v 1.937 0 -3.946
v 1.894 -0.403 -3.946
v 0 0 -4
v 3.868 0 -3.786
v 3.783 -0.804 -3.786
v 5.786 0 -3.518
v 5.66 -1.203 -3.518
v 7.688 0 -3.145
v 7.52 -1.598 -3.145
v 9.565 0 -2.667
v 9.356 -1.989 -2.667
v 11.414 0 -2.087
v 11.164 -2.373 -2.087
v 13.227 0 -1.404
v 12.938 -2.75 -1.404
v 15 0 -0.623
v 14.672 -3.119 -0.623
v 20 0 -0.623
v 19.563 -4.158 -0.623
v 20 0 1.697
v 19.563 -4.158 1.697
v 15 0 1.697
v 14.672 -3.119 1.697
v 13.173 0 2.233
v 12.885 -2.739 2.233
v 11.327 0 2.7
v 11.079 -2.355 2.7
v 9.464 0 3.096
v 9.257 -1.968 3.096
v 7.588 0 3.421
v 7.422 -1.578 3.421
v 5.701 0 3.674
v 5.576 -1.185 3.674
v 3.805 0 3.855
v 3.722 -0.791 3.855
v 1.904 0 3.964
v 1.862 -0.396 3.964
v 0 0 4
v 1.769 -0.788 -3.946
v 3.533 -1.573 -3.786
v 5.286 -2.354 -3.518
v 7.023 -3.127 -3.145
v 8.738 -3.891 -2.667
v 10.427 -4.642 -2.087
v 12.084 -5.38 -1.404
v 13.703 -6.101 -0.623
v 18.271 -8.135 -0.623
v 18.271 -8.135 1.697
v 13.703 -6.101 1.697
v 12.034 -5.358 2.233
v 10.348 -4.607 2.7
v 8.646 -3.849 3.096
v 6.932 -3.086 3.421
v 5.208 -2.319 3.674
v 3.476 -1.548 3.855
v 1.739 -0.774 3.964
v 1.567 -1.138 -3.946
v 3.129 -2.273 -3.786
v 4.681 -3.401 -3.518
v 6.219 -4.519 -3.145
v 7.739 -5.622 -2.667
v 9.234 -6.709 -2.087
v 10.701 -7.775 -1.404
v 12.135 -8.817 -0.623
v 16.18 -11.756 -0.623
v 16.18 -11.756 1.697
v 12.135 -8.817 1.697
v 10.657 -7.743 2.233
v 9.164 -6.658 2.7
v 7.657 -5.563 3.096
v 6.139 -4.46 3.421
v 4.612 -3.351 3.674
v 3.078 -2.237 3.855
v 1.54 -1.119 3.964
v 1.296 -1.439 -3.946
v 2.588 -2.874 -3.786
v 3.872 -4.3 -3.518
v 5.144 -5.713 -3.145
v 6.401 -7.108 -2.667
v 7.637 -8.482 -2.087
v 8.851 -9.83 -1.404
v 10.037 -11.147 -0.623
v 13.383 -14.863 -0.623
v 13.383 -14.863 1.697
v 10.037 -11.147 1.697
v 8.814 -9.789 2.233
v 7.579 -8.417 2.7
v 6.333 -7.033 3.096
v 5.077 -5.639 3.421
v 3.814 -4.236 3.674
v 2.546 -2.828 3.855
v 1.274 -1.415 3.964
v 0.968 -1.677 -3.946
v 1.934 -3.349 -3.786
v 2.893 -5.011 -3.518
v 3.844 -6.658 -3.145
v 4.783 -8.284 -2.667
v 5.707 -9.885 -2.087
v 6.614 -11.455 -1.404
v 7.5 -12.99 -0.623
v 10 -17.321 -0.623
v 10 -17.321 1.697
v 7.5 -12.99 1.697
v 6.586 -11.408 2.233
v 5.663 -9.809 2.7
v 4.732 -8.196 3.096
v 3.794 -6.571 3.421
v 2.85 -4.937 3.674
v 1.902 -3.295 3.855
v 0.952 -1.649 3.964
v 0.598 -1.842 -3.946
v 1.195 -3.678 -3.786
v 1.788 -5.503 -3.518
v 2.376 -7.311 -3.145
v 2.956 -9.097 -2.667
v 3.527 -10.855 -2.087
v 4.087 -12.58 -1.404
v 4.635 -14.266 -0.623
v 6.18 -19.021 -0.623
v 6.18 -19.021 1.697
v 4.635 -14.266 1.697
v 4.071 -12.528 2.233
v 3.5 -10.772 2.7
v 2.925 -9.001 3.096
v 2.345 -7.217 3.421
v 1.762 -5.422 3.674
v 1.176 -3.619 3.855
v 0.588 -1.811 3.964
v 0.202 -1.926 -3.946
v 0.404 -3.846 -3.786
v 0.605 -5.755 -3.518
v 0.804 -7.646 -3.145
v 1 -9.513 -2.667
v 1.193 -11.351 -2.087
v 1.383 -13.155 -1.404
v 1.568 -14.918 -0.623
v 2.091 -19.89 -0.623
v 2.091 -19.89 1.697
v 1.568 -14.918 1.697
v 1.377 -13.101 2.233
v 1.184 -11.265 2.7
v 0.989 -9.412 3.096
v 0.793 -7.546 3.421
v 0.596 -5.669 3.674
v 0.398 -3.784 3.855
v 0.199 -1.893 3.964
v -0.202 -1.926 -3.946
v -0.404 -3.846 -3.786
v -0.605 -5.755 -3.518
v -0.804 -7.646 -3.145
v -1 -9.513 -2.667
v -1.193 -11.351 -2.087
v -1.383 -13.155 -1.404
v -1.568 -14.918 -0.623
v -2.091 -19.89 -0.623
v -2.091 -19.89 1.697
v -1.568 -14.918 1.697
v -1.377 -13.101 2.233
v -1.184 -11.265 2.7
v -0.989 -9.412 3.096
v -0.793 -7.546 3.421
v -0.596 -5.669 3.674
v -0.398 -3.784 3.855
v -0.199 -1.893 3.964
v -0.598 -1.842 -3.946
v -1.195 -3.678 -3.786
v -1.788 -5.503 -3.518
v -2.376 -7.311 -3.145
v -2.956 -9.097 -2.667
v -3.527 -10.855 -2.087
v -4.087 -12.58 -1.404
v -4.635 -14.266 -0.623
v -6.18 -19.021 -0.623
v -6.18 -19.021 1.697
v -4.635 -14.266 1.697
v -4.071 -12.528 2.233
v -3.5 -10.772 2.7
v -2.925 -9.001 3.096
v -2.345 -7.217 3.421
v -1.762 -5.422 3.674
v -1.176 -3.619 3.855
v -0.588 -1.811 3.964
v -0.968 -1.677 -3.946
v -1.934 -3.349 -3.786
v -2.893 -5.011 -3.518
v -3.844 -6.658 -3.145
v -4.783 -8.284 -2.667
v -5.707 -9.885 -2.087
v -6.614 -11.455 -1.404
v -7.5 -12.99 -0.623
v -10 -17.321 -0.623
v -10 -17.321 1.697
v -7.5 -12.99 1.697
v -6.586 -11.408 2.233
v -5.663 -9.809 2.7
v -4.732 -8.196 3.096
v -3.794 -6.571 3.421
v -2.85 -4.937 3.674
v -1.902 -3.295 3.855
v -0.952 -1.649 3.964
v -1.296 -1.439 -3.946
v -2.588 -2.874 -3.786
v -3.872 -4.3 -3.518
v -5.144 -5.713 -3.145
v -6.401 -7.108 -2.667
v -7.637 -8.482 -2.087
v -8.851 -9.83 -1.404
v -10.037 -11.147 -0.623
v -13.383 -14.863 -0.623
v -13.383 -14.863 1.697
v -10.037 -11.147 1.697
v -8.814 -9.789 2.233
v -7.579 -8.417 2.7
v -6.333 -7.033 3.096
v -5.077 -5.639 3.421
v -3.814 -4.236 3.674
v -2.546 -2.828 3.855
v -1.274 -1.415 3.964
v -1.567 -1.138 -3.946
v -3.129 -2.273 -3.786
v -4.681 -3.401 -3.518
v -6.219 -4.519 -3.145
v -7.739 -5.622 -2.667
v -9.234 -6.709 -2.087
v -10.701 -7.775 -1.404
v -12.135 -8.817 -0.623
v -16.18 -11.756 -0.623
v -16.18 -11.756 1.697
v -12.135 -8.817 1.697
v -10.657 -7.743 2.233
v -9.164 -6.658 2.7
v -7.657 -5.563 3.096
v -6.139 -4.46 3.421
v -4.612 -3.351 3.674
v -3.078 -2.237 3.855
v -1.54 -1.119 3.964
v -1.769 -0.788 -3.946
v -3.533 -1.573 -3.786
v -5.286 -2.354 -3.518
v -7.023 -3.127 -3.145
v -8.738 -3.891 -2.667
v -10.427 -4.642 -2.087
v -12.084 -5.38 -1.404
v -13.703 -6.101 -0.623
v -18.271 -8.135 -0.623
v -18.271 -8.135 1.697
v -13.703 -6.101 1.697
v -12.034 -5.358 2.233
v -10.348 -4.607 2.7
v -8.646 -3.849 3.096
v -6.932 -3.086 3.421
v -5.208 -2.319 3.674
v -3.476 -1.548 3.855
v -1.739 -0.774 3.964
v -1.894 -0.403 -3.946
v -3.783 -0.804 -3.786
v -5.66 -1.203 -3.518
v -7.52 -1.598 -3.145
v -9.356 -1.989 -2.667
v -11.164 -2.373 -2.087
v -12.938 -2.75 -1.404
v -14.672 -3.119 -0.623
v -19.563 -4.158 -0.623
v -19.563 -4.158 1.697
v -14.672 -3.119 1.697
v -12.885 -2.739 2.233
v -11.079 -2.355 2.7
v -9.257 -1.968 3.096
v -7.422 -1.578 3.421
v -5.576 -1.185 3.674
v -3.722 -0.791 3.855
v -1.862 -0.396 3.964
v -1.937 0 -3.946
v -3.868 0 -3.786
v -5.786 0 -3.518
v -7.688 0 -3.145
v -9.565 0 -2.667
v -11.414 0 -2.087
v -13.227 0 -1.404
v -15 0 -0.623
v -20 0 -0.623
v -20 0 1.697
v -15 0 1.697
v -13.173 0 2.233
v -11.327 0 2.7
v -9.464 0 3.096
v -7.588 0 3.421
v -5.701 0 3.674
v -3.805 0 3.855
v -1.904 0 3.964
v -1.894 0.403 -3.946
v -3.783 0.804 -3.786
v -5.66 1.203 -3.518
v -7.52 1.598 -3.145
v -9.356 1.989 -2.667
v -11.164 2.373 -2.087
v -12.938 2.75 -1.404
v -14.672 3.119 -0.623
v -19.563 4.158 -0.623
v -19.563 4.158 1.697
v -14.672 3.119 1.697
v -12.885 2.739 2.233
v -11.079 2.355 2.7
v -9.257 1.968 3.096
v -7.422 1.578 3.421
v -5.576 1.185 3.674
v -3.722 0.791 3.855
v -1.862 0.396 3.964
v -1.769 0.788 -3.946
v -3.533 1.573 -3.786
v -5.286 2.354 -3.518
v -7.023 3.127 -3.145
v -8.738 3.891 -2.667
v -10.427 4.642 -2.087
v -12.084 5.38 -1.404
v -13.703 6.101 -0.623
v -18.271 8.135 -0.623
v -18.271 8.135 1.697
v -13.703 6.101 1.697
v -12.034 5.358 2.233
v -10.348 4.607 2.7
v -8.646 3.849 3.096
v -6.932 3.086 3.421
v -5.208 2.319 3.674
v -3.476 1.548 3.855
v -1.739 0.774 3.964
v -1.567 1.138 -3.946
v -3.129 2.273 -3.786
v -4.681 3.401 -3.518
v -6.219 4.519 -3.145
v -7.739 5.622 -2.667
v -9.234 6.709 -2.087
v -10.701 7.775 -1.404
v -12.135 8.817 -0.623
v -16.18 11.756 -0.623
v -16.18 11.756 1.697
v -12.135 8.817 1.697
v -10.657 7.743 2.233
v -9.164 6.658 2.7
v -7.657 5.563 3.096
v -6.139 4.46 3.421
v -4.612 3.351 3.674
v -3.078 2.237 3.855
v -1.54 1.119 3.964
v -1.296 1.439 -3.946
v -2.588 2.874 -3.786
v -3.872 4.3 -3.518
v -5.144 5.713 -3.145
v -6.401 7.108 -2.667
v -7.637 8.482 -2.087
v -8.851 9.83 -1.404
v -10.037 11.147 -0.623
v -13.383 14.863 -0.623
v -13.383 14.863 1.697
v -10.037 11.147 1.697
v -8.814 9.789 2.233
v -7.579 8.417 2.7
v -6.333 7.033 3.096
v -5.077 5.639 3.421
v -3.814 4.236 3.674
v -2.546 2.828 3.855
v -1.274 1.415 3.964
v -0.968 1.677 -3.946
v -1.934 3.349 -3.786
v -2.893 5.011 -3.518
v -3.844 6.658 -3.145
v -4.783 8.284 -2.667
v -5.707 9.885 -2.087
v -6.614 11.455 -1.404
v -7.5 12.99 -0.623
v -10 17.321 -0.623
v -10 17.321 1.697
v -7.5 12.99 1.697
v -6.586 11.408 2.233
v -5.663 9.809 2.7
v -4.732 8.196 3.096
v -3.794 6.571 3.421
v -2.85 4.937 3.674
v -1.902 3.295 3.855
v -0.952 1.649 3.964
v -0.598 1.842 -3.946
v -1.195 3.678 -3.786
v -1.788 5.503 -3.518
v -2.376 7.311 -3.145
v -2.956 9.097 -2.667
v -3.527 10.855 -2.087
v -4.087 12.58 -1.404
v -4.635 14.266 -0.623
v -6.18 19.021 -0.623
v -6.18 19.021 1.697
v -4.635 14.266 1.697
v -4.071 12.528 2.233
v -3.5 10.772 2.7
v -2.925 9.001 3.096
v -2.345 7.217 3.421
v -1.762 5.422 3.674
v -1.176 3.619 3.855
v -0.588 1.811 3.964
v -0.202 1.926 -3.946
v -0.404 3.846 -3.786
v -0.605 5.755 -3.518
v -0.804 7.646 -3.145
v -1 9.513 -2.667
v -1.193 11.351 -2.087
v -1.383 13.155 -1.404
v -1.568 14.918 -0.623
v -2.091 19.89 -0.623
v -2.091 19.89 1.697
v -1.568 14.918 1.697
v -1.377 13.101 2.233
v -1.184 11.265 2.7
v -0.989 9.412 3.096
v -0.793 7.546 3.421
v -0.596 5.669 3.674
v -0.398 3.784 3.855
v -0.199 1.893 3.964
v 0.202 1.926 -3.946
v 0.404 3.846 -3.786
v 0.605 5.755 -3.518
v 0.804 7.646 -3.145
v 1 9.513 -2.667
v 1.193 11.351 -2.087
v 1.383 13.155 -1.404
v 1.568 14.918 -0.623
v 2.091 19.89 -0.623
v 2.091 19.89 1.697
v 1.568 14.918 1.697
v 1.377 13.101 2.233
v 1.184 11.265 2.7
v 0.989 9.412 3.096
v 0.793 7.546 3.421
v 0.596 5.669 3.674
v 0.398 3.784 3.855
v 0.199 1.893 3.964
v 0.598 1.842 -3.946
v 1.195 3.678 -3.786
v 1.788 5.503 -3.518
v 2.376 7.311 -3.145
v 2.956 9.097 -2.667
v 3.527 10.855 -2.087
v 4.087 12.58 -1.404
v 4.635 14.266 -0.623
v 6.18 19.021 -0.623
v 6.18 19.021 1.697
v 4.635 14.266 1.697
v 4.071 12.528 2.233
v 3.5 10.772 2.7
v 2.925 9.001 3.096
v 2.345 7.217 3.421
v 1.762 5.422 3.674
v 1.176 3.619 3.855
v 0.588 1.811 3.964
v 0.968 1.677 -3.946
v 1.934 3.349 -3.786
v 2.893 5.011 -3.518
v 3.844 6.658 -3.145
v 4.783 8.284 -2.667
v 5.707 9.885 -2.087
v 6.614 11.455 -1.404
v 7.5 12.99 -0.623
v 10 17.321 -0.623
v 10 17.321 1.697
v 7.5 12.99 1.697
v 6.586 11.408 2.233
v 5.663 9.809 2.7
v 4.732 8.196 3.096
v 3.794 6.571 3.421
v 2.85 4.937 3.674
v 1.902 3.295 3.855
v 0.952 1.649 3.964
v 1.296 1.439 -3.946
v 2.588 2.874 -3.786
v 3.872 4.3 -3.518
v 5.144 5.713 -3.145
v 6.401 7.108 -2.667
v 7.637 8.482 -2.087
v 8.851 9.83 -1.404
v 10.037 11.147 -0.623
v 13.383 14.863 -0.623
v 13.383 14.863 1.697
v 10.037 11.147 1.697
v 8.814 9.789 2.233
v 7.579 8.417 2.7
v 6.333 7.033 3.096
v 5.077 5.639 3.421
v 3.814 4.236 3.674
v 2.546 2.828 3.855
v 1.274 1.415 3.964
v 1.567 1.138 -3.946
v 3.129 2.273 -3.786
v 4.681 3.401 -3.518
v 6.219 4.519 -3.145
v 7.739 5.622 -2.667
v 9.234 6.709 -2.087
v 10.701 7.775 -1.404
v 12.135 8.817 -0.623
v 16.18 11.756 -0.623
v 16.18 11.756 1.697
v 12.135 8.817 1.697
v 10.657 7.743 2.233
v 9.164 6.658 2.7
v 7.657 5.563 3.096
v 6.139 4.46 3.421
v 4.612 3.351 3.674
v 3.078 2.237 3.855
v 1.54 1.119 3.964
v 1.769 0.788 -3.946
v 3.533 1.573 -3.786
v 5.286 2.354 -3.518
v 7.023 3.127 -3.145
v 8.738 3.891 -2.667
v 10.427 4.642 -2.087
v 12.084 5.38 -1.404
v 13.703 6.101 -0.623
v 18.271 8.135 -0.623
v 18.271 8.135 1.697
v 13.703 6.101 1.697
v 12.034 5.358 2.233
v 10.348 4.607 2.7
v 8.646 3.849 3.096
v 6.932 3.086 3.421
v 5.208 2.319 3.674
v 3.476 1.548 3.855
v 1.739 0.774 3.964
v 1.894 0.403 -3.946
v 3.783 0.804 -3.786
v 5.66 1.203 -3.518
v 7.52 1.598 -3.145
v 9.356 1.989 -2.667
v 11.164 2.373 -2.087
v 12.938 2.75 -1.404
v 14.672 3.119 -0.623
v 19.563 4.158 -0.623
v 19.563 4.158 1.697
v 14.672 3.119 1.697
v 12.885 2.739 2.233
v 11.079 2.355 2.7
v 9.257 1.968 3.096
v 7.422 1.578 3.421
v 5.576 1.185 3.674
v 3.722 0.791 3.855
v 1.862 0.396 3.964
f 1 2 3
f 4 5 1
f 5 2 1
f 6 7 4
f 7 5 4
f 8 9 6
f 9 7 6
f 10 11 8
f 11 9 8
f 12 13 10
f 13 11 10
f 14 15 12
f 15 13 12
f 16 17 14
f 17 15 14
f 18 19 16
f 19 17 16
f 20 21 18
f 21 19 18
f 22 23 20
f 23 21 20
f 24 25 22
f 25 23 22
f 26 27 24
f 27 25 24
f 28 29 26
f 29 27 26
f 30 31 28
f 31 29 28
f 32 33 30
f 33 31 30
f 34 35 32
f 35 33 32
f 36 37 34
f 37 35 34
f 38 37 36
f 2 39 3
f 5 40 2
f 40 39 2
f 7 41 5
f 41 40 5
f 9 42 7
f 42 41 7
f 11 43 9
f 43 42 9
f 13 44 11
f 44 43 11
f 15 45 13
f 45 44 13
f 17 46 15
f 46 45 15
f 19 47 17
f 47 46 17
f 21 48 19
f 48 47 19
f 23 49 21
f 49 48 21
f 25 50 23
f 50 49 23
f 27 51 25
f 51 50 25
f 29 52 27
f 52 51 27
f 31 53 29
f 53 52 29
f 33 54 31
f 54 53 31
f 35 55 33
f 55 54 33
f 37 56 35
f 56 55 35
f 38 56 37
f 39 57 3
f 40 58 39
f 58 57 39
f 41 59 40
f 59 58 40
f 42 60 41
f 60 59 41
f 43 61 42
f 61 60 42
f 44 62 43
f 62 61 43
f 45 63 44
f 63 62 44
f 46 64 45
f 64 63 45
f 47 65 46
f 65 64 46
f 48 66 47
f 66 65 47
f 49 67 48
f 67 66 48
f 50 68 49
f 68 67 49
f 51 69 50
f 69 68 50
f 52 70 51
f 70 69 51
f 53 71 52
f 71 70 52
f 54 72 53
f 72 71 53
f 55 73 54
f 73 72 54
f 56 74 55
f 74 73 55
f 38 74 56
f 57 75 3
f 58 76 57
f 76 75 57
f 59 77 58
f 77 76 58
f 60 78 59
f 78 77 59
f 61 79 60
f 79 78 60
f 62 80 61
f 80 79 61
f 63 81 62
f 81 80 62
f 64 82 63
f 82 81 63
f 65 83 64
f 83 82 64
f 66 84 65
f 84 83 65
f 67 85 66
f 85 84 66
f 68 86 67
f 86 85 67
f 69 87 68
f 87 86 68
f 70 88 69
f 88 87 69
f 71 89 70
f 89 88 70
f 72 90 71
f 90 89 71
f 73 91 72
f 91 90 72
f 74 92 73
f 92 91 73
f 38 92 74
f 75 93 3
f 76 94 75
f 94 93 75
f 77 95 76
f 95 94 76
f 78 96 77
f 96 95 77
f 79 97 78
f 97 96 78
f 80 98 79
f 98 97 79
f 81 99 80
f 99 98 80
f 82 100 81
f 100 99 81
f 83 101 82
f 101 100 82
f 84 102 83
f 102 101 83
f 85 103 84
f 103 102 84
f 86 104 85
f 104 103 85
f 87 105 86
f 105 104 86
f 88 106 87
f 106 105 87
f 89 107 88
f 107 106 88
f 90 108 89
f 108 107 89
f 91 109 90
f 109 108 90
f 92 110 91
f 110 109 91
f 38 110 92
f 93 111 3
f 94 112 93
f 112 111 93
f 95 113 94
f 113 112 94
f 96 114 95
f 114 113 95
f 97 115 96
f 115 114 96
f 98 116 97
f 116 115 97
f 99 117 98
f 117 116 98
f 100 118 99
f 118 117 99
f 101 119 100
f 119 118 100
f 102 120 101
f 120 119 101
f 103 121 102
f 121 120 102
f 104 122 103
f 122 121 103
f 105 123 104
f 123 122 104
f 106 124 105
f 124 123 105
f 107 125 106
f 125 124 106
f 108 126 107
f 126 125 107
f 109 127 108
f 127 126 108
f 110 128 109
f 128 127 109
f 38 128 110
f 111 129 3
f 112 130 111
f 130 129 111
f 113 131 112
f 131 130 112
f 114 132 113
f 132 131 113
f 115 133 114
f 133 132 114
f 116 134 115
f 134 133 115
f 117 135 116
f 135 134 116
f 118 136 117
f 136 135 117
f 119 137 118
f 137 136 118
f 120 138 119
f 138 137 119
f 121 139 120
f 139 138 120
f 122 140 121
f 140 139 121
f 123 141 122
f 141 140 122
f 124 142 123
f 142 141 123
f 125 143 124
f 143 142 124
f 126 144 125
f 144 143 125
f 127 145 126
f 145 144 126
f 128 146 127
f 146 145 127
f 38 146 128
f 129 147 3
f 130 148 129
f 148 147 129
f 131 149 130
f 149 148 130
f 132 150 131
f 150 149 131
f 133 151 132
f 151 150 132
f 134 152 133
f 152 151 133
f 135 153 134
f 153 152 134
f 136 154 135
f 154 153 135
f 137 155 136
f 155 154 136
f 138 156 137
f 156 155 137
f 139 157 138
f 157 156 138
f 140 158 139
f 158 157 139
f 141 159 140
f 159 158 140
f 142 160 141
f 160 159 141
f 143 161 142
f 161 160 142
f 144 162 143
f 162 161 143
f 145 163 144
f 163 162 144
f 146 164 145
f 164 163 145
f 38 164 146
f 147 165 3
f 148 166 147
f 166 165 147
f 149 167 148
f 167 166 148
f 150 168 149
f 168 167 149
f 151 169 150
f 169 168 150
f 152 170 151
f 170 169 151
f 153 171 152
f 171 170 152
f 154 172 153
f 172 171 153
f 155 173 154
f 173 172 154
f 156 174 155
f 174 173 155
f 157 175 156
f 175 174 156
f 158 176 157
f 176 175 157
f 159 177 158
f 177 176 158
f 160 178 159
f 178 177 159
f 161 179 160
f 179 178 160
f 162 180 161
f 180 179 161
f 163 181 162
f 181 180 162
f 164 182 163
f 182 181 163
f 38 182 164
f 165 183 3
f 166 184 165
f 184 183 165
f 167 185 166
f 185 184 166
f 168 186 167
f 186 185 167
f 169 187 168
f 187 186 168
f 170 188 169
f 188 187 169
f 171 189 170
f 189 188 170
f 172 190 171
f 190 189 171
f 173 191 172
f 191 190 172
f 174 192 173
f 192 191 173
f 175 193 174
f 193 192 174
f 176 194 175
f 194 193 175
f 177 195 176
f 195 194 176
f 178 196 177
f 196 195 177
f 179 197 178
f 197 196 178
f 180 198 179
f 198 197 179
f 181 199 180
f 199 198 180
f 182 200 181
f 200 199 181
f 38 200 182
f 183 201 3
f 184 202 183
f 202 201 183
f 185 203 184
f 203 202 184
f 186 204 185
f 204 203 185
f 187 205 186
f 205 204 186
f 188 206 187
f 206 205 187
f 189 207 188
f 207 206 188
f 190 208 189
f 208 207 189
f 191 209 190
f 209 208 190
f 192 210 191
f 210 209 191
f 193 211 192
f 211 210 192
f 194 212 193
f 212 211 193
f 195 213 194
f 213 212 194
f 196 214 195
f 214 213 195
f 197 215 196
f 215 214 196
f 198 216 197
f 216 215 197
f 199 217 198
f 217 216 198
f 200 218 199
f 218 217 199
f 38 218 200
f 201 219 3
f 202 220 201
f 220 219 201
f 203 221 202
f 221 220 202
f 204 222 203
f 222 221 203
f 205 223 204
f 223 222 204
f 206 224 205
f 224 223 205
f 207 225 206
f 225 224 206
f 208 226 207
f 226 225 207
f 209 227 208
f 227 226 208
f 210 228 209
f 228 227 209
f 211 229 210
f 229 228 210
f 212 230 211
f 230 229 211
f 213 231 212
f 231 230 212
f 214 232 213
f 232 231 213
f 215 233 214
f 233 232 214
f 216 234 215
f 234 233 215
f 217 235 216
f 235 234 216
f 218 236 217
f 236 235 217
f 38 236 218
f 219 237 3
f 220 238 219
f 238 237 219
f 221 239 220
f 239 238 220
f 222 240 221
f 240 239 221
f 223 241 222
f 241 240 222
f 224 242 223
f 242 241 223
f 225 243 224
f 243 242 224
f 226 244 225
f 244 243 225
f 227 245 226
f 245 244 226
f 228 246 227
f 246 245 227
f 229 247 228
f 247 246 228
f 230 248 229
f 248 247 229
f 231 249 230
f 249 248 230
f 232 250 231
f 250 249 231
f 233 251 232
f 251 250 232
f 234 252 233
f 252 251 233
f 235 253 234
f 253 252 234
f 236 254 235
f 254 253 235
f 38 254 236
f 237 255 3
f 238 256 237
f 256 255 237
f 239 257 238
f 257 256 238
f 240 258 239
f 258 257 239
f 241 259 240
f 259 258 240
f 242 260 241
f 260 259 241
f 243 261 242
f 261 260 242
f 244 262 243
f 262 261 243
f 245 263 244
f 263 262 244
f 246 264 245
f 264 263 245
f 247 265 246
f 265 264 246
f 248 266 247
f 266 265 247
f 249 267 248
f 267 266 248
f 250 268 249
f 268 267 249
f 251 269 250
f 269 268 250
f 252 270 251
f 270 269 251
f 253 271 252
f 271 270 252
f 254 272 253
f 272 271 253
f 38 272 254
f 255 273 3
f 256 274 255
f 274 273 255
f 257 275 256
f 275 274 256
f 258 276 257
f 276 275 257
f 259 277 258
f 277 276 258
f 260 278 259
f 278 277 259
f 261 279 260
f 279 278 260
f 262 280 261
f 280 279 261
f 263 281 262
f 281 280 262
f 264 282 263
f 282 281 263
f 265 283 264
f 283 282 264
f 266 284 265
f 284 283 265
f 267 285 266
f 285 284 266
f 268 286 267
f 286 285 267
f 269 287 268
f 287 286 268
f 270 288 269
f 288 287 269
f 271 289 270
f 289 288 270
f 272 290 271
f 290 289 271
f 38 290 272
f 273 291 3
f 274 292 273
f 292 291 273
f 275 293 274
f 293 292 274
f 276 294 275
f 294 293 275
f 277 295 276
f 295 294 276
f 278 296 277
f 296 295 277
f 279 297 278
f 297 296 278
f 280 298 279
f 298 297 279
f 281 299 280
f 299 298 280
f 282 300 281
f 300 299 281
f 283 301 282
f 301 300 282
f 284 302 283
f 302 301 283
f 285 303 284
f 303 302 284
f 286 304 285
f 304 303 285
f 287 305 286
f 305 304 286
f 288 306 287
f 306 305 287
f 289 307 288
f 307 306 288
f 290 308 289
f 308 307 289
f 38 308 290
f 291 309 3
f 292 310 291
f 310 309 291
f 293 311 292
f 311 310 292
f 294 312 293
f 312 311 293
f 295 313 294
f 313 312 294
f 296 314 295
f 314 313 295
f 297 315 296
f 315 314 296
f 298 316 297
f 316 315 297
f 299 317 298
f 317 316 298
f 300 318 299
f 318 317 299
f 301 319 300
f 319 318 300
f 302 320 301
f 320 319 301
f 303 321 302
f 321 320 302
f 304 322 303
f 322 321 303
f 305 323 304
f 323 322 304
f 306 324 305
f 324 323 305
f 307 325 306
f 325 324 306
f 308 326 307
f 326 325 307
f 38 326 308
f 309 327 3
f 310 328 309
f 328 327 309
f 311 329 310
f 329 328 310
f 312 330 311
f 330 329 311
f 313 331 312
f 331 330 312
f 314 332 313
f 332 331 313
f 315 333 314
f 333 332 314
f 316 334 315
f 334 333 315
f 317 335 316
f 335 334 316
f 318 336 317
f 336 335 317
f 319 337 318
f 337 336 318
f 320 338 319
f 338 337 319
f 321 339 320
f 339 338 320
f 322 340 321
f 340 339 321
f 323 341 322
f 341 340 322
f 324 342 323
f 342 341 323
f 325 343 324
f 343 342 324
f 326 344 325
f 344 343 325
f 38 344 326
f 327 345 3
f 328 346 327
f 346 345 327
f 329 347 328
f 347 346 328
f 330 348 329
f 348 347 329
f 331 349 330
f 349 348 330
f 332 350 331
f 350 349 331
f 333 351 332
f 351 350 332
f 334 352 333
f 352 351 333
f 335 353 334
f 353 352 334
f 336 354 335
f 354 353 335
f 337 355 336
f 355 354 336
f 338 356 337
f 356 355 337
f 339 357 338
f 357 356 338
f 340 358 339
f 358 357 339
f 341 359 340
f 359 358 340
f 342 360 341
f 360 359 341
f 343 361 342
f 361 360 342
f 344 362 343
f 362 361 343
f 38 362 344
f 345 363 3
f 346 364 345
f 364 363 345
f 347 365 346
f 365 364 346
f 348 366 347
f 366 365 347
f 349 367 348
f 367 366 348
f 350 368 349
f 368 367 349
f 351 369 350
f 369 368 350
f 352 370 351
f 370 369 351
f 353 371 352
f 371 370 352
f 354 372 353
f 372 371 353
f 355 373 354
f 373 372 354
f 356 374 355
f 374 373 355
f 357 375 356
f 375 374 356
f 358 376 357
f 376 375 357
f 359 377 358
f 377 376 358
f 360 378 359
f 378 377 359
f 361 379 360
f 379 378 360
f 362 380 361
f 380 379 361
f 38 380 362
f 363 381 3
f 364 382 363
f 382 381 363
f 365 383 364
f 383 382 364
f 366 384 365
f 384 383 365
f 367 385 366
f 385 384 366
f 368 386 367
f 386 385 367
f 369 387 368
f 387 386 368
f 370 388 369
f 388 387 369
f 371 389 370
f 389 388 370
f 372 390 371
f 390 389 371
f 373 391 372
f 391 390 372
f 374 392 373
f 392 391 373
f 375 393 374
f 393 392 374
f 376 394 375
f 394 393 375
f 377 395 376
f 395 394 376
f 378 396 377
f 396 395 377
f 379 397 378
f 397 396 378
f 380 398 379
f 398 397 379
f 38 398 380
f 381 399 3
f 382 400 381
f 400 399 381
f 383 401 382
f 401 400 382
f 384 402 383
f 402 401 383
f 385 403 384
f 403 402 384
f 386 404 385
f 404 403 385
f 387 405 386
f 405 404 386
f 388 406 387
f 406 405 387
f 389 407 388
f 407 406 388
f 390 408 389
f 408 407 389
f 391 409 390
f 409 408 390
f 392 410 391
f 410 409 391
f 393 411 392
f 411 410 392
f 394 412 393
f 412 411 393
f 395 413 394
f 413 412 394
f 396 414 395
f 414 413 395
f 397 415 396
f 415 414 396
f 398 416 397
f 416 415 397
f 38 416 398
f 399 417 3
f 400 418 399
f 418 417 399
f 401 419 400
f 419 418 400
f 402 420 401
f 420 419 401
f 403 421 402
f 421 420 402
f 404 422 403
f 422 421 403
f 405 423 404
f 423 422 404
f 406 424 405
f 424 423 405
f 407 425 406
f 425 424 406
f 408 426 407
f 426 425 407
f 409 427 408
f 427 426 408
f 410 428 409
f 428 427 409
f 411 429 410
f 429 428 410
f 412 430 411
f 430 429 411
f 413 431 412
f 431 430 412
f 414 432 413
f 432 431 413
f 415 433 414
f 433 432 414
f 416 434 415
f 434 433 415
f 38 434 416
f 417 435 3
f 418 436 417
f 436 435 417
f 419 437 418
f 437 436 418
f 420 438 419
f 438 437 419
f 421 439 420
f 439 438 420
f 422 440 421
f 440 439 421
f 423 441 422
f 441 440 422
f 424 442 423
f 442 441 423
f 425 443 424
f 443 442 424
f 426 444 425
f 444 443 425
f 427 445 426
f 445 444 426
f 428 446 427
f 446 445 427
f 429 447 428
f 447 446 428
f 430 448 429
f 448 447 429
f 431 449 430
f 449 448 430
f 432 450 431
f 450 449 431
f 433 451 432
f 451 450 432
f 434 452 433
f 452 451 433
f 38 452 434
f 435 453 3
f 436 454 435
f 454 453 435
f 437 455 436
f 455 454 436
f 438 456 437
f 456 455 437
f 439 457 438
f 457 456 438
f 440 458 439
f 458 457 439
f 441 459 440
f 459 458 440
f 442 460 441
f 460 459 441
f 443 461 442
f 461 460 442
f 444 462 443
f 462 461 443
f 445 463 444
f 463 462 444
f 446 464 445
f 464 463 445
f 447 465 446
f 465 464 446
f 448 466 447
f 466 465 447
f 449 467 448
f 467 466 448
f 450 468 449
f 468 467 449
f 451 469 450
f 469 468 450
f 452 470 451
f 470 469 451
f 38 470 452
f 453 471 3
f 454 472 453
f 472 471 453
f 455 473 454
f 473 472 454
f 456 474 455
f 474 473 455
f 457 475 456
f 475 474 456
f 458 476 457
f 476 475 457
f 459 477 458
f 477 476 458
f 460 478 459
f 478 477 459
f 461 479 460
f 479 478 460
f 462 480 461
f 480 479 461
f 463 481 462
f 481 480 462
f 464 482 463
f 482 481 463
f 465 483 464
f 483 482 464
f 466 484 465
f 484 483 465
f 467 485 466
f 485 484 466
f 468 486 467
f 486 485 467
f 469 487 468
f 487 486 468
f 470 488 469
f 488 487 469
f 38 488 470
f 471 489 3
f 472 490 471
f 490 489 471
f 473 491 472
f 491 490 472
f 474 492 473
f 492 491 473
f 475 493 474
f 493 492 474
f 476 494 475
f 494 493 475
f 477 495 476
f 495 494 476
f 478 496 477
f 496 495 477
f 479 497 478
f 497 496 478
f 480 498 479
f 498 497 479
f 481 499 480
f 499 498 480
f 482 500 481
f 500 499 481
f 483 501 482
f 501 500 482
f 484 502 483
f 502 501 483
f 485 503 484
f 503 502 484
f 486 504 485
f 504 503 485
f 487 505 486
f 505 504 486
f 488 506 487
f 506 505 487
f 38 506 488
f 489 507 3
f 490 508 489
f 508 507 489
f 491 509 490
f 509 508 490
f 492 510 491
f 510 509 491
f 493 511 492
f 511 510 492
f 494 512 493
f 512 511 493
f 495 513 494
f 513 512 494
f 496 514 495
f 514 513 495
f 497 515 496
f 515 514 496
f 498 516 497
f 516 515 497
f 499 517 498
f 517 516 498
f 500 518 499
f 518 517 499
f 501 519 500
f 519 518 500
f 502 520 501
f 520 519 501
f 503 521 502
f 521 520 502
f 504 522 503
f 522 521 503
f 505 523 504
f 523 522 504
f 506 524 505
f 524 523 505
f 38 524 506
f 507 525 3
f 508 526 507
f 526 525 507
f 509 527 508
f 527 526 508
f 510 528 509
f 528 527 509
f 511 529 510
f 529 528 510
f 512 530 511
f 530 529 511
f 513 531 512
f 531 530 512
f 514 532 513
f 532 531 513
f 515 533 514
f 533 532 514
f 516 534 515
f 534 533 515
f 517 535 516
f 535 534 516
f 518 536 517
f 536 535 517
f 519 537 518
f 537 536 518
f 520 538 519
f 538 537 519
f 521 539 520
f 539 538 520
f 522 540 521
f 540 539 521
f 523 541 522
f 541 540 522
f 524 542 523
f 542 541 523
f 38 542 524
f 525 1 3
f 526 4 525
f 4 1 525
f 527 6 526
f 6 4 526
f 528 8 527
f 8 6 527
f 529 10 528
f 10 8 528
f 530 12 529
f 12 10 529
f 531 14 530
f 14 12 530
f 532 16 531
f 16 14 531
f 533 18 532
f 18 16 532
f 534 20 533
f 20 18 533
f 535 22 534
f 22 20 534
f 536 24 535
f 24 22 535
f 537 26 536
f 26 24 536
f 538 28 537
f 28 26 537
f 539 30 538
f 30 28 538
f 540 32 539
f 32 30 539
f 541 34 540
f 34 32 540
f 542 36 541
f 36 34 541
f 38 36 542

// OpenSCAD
// Generated by Parametrix
ca_lens_x1_faceLensSim_000 = [ [ 4.0000, 0.0000 ],[ 3.9637, 1.9039 ],[ 3.8550, 3.8050 ],[ 3.6740, 5.7006 ],[ 3.4209, 7.5879 ],[ 3.0961, 9.4642 ],[ 2.7001, 11.3268 ],[ 2.2335, 13.1729 ],[ 1.6970, 15.0000 ],[ 1.6970, 20.0000 ],[ -0.6228, 20.0000 ],[ -0.6228, 15.0000 ],[ -1.4044, 13.2272 ],[ -2.0866, 11.4138 ],[ -2.6675, 9.5654 ],[ -3.1453, 7.6877 ],[ -3.5183, 5.7865 ],[ -3.7857, 3.8676 ],[ -3.9464, 1.9367 ],[ -4.0000, 0.0000 ],[ -3.9464, -1.9367 ],[ -3.7857, -3.8676 ],[ -3.5183, -5.7865 ],[ -3.1453, -7.6877 ],[ -2.6675, -9.5654 ],[ -2.0866, -11.4138 ],[ -1.4044, -13.2272 ],[ -0.6228, -15.0000 ],[ -0.6228, -20.0000 ],[ 1.6970, -20.0000 ],[ 1.6970, -15.0000 ],[ 2.2335, -13.1729 ],[ 2.7001, -11.3268 ],[ 3.0961, -9.4642 ],[ 3.4209, -7.5879 ],[ 3.6740, -5.7006 ],[ 3.8550, -3.8050 ],[ 3.9637, -1.9039 ],[ 4.0000, 0.0000 ] ];
cb_lens_x1_faceLensSim_000 = [  0, 1, 2, 3, 4, 5, 6, 7, 8, 9, 10, 11, 12, 13, 14, 15, 16, 17, 18, 19, 20, 21, 22, 23, 24, 25, 26, 27, 28, 29, 30, 31, 32, 33, 34, 35, 36, 37, 38 ];
a_lens_x1_faceLensSim = concat(ca_lens_x1_faceLensSim_000);
b_lens_x1_faceLensSim = [cb_lens_x1_faceLensSim_000];
ca_lens_x1_faceLens3D_000 = [ [ 0.0000, 4.0000 ],[ -1.9039, 3.9637 ],[ -3.8050, 3.8550 ],[ -5.7006, 3.6740 ],[ -7.5879, 3.4209 ],[ -9.4642, 3.0961 ],[ -11.3268, 2.7001 ],[ -13.1729, 2.2335 ],[ -15.0000, 1.6970 ],[ -20.0000, 1.6970 ],[ -20.0000, -0.6228 ],[ -15.0000, -0.6228 ],[ -13.2272, -1.4044 ],[ -11.4138, -2.0866 ],[ -9.5654, -2.6675 ],[ -7.6877, -3.1453 ],[ -5.7865, -3.5183 ],[ -3.8676, -3.7857 ],[ -1.9367, -3.9464 ],[ -0.0000, -4.0000 ],[ 0.0000, 4.0000 ] ];
cb_lens_x1_faceLens3D_000 = [  0, 1, 2, 3, 4, 5, 6, 7, 8, 9, 10, 11, 12, 13, 14, 15, 16, 17, 18, 19, 20 ];
a_lens_x1_faceLens3D = concat(ca_lens_x1_faceLens3D_000);
b_lens_x1_faceLens3D = [cb_lens_x1_faceLens3D_000];

module subpax_lens_x1 () {
	translate( [ 0, 0, 0 ])
		rotate( [ 0, 0, 0 ])
			   rotate_extrude() polygon(a_lens_x1_faceLens3D, b_lens_x1_faceLens3D);
}

module pax_lens_x1 () {
	subpax_lens_x1();
}

pax_lens_x1();
